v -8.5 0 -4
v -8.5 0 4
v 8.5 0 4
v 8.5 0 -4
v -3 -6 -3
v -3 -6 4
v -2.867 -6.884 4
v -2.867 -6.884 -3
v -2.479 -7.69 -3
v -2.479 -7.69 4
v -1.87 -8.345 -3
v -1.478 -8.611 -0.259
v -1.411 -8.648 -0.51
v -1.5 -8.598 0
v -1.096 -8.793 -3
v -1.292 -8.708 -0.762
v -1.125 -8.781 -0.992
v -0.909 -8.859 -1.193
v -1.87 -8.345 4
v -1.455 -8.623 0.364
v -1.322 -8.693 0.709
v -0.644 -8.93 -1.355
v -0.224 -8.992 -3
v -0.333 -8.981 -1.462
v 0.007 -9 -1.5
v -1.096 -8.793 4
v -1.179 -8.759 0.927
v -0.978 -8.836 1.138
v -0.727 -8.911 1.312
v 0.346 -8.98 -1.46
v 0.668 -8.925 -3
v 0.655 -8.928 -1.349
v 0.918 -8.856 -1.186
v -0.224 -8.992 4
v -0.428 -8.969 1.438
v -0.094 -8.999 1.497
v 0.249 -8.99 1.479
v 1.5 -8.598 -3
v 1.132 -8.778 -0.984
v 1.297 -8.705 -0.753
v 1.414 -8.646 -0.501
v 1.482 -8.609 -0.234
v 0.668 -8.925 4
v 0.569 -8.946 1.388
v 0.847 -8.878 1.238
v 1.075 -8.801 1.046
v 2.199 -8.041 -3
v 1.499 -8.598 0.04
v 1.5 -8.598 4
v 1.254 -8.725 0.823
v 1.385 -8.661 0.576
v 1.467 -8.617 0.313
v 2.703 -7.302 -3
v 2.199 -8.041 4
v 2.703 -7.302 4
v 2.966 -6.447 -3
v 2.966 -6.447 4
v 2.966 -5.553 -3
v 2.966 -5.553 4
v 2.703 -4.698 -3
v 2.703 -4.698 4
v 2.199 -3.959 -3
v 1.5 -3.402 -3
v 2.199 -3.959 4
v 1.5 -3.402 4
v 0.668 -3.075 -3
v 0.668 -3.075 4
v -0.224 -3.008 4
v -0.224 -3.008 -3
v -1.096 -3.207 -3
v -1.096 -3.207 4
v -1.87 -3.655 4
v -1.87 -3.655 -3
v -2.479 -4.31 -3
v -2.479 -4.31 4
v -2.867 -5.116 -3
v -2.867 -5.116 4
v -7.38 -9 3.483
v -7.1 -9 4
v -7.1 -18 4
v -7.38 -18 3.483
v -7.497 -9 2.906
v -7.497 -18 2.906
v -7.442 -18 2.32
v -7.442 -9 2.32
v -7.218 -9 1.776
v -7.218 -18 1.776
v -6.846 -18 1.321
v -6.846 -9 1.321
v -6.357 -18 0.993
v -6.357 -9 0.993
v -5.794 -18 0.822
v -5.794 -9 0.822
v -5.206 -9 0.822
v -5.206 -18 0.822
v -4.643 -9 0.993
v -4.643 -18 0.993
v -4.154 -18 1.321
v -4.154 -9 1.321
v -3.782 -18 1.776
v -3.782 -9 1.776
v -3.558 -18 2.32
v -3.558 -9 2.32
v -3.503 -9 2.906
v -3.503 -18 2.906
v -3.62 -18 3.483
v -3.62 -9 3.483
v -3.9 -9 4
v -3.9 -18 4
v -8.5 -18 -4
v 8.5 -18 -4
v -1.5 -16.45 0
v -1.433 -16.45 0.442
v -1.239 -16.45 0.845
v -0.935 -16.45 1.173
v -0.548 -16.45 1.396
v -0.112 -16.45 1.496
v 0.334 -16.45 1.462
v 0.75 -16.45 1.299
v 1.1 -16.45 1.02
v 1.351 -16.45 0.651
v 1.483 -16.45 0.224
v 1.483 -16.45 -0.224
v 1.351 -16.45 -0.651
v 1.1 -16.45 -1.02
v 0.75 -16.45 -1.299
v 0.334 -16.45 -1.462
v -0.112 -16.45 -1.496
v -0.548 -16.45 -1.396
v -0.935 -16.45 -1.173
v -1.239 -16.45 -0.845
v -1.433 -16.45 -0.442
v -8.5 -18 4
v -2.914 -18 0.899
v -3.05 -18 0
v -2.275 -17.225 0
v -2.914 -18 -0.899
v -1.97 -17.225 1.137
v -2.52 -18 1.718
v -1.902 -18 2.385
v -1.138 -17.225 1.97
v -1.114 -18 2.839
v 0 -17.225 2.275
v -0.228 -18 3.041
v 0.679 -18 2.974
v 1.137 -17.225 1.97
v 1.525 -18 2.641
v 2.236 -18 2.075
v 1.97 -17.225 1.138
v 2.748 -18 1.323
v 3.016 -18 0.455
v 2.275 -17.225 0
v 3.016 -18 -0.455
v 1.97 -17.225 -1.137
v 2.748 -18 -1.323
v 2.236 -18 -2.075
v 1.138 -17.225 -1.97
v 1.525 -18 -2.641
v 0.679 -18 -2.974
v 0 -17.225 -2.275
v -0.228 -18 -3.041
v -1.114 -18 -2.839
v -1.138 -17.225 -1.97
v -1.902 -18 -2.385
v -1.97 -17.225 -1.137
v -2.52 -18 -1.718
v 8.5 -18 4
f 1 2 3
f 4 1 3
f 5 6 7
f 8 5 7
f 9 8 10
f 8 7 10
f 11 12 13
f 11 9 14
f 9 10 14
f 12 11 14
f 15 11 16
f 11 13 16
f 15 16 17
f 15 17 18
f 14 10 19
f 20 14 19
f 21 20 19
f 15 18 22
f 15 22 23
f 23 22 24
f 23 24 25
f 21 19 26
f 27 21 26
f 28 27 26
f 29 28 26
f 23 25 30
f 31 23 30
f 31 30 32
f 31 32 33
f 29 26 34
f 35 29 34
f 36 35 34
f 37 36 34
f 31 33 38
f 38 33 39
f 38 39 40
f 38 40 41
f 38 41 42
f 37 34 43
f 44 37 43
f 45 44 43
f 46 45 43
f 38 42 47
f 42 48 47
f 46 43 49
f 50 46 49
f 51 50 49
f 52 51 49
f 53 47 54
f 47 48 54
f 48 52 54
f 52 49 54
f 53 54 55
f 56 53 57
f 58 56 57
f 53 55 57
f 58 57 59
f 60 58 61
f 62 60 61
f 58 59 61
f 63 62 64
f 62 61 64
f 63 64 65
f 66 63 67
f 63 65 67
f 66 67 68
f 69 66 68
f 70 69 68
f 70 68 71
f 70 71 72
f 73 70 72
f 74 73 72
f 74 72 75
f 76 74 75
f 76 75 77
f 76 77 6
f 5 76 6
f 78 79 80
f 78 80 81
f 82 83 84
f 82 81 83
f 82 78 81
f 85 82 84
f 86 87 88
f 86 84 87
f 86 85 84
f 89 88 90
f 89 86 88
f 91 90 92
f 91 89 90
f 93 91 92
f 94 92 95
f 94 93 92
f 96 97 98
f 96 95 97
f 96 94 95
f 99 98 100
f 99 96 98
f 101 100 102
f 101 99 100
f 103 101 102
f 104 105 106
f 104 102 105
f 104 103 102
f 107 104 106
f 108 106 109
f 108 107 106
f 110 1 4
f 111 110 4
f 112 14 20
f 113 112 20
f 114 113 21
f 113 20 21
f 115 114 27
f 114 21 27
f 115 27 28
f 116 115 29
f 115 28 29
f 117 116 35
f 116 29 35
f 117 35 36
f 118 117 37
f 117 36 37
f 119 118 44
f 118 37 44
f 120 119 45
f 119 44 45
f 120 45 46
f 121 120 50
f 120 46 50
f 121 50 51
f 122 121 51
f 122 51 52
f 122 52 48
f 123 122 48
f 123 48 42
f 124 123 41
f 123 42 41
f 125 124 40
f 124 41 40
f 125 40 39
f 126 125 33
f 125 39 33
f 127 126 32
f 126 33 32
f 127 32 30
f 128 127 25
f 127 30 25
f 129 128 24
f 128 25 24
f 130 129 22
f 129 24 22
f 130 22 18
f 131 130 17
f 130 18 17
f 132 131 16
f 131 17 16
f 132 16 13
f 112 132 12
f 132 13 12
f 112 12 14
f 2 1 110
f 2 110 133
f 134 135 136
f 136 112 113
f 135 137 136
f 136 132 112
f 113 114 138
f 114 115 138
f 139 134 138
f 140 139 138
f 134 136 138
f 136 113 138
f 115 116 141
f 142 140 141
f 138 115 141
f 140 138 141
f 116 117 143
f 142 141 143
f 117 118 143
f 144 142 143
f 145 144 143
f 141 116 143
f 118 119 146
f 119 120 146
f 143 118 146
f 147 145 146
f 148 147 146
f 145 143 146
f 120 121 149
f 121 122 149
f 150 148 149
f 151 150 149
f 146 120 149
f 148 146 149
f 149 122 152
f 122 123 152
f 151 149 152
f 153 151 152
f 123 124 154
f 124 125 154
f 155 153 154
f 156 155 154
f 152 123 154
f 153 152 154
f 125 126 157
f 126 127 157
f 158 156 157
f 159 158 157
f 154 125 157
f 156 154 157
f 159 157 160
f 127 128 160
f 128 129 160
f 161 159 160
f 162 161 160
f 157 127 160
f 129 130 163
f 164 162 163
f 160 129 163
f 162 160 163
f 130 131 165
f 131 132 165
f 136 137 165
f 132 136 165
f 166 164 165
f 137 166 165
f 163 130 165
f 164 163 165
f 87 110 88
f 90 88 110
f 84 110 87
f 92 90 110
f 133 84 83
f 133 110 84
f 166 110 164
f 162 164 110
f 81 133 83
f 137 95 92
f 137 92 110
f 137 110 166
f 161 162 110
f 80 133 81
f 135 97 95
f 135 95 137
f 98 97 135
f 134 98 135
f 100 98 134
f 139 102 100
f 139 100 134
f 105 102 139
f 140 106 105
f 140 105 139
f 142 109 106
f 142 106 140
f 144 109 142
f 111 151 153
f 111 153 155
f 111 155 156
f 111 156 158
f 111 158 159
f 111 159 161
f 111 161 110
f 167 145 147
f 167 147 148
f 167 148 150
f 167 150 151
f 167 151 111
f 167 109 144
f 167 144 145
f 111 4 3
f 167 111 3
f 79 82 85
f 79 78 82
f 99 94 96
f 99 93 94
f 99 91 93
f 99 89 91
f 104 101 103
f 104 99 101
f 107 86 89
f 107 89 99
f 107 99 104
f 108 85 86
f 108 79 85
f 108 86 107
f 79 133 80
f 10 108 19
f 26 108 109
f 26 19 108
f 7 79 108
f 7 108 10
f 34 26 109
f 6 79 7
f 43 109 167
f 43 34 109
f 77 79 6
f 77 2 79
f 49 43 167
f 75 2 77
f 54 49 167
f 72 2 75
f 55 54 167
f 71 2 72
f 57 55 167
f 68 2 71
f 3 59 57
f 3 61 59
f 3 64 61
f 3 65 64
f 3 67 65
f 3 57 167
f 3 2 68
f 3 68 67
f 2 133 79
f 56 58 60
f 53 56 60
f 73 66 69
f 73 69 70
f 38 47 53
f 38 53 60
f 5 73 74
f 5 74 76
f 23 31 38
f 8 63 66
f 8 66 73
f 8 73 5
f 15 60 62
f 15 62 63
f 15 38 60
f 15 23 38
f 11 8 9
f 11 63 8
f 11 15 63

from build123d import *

# Parameters (mm, degrees)
CYLINDER002_R       = 2
CYLINDER002_DEPTH   = 10
SKETCH007_W         = 17
SKETCH007_H         = 8
PAD002_DEPTH        = 18
HOLE003_D           = 3
HOLE003_DEPTH       = 10
HOLE003_CSINK_D     = 6.1
HOLE003_CSINK_ANGLE = 90
HOLE003_TIPS_R      = 1.5
SKETCH009_R         = 3
HOLE004_DEPTH       = 7


with BuildPart() as cylinder002:
    # Cylinder002 → Cylinder002 (new body)
    with BuildSketch(Plane(origin=(-5.5, -9, 2.8), x_dir=(1, 0, 0), z_dir=(0, -1, 0))):
        Circle(CYLINDER002_R)
    extrude(amount=CYLINDER002_DEPTH)


with BuildPart() as cut002004:
    # Sketch007 → Pad002 (new body)
    with BuildSketch(Plane.XZ):
        Rectangle(SKETCH007_W, SKETCH007_H)
    extrude(amount=PAD002_DEPTH)

    # Hole003
    with Locations(Plane.XZ.offset(18)):
        with Locations((0, 0)):
            CounterSinkHole(HOLE003_D / 2, HOLE003_CSINK_D / 2, depth=HOLE003_DEPTH, counter_sink_angle=HOLE003_CSINK_ANGLE)

    # Hole003 tips → Hole003 tip 1 section 0
    with BuildSketch(Plane.XZ.offset(8), mode=Mode.PRIVATE) as hole003_tip_1_s0:
        Circle(HOLE003_TIPS_R)
    loft([hole003_tip_1_s0.sketch, Vertex(0, -7.098709, 0)], mode=Mode.SUBTRACT)

    # Sketch009 (on Face1 of Hole003) → Hole004 (cut)
    with BuildSketch(Plane(origin=(0, 0, 4), x_dir=(-1, 0, 0), z_dir=(0, 0, 1))):
        with Locations((0, 6)):
            Circle(SKETCH009_R)
    extrude(amount=-HOLE004_DEPTH, mode=Mode.SUBTRACT)

    # Cut002004: cut Cylinder002
    add(cylinder002.part, mode=Mode.SUBTRACT)


solid = cut002004.part
